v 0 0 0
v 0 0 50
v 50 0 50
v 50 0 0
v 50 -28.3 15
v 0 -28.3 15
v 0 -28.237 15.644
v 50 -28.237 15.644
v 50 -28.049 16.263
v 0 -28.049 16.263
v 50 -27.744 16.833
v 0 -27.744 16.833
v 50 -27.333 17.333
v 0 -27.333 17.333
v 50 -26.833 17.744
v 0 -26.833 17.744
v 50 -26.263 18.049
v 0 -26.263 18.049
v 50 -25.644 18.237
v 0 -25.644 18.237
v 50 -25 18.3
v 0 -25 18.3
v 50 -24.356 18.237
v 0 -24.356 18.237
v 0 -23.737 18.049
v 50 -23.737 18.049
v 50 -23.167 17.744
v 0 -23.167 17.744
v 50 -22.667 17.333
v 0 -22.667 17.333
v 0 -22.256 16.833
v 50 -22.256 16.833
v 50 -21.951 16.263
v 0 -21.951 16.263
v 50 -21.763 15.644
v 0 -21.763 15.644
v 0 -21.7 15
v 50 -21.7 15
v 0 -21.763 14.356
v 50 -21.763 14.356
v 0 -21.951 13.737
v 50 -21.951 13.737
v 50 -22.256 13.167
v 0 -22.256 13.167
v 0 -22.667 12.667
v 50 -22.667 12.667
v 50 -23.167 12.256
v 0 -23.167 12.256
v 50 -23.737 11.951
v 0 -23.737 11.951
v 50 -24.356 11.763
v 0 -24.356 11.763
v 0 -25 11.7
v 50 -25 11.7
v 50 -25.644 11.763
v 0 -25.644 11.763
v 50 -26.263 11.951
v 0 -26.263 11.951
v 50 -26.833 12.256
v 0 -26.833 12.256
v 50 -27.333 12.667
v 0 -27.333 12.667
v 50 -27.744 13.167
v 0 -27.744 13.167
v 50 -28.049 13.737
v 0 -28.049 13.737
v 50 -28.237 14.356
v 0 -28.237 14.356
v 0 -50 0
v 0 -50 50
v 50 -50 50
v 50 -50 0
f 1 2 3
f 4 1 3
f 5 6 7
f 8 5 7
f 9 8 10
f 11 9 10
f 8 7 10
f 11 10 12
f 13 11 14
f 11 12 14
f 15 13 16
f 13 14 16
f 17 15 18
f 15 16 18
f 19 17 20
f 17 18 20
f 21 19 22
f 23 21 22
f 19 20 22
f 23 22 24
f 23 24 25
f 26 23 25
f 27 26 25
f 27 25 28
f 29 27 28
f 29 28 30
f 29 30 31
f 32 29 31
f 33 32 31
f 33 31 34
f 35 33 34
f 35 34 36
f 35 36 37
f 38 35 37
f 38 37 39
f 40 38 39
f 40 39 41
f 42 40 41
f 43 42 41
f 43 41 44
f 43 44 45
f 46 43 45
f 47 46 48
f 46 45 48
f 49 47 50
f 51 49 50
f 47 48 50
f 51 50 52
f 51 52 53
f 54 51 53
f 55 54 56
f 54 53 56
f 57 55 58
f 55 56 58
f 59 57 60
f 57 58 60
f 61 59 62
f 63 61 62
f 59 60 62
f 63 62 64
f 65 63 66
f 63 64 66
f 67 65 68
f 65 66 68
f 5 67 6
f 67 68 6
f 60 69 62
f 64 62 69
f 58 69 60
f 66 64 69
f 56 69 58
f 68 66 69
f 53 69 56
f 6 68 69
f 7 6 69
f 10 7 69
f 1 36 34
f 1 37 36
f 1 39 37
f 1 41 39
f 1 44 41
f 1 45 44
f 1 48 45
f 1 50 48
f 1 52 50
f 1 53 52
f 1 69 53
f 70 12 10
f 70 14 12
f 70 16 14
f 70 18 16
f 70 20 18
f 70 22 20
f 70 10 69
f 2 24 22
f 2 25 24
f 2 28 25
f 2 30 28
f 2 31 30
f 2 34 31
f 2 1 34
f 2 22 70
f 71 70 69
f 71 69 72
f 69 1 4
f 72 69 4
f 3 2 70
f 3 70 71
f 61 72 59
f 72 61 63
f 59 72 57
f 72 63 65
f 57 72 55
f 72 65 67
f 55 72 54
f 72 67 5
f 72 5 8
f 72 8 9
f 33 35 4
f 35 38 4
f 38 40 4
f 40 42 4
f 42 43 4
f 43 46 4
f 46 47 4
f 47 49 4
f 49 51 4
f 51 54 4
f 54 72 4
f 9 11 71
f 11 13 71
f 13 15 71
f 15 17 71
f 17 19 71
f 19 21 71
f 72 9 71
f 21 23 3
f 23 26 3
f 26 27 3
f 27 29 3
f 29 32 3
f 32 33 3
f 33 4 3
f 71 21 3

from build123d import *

# Parameters (mm, degrees)
F0_W     = 50
F0_H     = 50
F1_DEPTH = 50
F3_D     = 6.6


with BuildPart() as f1:
    # F0 (on Front) → F1 (new body)
    with BuildSketch(Plane.XZ):
        with Locations((25, 25)):
            Rectangle(F0_W, F0_H)
    extrude(amount=F1_DEPTH)

    # F3 (through all)
    with Locations(Plane.YZ.offset(50)):
        with Locations((-25, 15)):
            Hole(F3_D / 2)


solid = f1.part
